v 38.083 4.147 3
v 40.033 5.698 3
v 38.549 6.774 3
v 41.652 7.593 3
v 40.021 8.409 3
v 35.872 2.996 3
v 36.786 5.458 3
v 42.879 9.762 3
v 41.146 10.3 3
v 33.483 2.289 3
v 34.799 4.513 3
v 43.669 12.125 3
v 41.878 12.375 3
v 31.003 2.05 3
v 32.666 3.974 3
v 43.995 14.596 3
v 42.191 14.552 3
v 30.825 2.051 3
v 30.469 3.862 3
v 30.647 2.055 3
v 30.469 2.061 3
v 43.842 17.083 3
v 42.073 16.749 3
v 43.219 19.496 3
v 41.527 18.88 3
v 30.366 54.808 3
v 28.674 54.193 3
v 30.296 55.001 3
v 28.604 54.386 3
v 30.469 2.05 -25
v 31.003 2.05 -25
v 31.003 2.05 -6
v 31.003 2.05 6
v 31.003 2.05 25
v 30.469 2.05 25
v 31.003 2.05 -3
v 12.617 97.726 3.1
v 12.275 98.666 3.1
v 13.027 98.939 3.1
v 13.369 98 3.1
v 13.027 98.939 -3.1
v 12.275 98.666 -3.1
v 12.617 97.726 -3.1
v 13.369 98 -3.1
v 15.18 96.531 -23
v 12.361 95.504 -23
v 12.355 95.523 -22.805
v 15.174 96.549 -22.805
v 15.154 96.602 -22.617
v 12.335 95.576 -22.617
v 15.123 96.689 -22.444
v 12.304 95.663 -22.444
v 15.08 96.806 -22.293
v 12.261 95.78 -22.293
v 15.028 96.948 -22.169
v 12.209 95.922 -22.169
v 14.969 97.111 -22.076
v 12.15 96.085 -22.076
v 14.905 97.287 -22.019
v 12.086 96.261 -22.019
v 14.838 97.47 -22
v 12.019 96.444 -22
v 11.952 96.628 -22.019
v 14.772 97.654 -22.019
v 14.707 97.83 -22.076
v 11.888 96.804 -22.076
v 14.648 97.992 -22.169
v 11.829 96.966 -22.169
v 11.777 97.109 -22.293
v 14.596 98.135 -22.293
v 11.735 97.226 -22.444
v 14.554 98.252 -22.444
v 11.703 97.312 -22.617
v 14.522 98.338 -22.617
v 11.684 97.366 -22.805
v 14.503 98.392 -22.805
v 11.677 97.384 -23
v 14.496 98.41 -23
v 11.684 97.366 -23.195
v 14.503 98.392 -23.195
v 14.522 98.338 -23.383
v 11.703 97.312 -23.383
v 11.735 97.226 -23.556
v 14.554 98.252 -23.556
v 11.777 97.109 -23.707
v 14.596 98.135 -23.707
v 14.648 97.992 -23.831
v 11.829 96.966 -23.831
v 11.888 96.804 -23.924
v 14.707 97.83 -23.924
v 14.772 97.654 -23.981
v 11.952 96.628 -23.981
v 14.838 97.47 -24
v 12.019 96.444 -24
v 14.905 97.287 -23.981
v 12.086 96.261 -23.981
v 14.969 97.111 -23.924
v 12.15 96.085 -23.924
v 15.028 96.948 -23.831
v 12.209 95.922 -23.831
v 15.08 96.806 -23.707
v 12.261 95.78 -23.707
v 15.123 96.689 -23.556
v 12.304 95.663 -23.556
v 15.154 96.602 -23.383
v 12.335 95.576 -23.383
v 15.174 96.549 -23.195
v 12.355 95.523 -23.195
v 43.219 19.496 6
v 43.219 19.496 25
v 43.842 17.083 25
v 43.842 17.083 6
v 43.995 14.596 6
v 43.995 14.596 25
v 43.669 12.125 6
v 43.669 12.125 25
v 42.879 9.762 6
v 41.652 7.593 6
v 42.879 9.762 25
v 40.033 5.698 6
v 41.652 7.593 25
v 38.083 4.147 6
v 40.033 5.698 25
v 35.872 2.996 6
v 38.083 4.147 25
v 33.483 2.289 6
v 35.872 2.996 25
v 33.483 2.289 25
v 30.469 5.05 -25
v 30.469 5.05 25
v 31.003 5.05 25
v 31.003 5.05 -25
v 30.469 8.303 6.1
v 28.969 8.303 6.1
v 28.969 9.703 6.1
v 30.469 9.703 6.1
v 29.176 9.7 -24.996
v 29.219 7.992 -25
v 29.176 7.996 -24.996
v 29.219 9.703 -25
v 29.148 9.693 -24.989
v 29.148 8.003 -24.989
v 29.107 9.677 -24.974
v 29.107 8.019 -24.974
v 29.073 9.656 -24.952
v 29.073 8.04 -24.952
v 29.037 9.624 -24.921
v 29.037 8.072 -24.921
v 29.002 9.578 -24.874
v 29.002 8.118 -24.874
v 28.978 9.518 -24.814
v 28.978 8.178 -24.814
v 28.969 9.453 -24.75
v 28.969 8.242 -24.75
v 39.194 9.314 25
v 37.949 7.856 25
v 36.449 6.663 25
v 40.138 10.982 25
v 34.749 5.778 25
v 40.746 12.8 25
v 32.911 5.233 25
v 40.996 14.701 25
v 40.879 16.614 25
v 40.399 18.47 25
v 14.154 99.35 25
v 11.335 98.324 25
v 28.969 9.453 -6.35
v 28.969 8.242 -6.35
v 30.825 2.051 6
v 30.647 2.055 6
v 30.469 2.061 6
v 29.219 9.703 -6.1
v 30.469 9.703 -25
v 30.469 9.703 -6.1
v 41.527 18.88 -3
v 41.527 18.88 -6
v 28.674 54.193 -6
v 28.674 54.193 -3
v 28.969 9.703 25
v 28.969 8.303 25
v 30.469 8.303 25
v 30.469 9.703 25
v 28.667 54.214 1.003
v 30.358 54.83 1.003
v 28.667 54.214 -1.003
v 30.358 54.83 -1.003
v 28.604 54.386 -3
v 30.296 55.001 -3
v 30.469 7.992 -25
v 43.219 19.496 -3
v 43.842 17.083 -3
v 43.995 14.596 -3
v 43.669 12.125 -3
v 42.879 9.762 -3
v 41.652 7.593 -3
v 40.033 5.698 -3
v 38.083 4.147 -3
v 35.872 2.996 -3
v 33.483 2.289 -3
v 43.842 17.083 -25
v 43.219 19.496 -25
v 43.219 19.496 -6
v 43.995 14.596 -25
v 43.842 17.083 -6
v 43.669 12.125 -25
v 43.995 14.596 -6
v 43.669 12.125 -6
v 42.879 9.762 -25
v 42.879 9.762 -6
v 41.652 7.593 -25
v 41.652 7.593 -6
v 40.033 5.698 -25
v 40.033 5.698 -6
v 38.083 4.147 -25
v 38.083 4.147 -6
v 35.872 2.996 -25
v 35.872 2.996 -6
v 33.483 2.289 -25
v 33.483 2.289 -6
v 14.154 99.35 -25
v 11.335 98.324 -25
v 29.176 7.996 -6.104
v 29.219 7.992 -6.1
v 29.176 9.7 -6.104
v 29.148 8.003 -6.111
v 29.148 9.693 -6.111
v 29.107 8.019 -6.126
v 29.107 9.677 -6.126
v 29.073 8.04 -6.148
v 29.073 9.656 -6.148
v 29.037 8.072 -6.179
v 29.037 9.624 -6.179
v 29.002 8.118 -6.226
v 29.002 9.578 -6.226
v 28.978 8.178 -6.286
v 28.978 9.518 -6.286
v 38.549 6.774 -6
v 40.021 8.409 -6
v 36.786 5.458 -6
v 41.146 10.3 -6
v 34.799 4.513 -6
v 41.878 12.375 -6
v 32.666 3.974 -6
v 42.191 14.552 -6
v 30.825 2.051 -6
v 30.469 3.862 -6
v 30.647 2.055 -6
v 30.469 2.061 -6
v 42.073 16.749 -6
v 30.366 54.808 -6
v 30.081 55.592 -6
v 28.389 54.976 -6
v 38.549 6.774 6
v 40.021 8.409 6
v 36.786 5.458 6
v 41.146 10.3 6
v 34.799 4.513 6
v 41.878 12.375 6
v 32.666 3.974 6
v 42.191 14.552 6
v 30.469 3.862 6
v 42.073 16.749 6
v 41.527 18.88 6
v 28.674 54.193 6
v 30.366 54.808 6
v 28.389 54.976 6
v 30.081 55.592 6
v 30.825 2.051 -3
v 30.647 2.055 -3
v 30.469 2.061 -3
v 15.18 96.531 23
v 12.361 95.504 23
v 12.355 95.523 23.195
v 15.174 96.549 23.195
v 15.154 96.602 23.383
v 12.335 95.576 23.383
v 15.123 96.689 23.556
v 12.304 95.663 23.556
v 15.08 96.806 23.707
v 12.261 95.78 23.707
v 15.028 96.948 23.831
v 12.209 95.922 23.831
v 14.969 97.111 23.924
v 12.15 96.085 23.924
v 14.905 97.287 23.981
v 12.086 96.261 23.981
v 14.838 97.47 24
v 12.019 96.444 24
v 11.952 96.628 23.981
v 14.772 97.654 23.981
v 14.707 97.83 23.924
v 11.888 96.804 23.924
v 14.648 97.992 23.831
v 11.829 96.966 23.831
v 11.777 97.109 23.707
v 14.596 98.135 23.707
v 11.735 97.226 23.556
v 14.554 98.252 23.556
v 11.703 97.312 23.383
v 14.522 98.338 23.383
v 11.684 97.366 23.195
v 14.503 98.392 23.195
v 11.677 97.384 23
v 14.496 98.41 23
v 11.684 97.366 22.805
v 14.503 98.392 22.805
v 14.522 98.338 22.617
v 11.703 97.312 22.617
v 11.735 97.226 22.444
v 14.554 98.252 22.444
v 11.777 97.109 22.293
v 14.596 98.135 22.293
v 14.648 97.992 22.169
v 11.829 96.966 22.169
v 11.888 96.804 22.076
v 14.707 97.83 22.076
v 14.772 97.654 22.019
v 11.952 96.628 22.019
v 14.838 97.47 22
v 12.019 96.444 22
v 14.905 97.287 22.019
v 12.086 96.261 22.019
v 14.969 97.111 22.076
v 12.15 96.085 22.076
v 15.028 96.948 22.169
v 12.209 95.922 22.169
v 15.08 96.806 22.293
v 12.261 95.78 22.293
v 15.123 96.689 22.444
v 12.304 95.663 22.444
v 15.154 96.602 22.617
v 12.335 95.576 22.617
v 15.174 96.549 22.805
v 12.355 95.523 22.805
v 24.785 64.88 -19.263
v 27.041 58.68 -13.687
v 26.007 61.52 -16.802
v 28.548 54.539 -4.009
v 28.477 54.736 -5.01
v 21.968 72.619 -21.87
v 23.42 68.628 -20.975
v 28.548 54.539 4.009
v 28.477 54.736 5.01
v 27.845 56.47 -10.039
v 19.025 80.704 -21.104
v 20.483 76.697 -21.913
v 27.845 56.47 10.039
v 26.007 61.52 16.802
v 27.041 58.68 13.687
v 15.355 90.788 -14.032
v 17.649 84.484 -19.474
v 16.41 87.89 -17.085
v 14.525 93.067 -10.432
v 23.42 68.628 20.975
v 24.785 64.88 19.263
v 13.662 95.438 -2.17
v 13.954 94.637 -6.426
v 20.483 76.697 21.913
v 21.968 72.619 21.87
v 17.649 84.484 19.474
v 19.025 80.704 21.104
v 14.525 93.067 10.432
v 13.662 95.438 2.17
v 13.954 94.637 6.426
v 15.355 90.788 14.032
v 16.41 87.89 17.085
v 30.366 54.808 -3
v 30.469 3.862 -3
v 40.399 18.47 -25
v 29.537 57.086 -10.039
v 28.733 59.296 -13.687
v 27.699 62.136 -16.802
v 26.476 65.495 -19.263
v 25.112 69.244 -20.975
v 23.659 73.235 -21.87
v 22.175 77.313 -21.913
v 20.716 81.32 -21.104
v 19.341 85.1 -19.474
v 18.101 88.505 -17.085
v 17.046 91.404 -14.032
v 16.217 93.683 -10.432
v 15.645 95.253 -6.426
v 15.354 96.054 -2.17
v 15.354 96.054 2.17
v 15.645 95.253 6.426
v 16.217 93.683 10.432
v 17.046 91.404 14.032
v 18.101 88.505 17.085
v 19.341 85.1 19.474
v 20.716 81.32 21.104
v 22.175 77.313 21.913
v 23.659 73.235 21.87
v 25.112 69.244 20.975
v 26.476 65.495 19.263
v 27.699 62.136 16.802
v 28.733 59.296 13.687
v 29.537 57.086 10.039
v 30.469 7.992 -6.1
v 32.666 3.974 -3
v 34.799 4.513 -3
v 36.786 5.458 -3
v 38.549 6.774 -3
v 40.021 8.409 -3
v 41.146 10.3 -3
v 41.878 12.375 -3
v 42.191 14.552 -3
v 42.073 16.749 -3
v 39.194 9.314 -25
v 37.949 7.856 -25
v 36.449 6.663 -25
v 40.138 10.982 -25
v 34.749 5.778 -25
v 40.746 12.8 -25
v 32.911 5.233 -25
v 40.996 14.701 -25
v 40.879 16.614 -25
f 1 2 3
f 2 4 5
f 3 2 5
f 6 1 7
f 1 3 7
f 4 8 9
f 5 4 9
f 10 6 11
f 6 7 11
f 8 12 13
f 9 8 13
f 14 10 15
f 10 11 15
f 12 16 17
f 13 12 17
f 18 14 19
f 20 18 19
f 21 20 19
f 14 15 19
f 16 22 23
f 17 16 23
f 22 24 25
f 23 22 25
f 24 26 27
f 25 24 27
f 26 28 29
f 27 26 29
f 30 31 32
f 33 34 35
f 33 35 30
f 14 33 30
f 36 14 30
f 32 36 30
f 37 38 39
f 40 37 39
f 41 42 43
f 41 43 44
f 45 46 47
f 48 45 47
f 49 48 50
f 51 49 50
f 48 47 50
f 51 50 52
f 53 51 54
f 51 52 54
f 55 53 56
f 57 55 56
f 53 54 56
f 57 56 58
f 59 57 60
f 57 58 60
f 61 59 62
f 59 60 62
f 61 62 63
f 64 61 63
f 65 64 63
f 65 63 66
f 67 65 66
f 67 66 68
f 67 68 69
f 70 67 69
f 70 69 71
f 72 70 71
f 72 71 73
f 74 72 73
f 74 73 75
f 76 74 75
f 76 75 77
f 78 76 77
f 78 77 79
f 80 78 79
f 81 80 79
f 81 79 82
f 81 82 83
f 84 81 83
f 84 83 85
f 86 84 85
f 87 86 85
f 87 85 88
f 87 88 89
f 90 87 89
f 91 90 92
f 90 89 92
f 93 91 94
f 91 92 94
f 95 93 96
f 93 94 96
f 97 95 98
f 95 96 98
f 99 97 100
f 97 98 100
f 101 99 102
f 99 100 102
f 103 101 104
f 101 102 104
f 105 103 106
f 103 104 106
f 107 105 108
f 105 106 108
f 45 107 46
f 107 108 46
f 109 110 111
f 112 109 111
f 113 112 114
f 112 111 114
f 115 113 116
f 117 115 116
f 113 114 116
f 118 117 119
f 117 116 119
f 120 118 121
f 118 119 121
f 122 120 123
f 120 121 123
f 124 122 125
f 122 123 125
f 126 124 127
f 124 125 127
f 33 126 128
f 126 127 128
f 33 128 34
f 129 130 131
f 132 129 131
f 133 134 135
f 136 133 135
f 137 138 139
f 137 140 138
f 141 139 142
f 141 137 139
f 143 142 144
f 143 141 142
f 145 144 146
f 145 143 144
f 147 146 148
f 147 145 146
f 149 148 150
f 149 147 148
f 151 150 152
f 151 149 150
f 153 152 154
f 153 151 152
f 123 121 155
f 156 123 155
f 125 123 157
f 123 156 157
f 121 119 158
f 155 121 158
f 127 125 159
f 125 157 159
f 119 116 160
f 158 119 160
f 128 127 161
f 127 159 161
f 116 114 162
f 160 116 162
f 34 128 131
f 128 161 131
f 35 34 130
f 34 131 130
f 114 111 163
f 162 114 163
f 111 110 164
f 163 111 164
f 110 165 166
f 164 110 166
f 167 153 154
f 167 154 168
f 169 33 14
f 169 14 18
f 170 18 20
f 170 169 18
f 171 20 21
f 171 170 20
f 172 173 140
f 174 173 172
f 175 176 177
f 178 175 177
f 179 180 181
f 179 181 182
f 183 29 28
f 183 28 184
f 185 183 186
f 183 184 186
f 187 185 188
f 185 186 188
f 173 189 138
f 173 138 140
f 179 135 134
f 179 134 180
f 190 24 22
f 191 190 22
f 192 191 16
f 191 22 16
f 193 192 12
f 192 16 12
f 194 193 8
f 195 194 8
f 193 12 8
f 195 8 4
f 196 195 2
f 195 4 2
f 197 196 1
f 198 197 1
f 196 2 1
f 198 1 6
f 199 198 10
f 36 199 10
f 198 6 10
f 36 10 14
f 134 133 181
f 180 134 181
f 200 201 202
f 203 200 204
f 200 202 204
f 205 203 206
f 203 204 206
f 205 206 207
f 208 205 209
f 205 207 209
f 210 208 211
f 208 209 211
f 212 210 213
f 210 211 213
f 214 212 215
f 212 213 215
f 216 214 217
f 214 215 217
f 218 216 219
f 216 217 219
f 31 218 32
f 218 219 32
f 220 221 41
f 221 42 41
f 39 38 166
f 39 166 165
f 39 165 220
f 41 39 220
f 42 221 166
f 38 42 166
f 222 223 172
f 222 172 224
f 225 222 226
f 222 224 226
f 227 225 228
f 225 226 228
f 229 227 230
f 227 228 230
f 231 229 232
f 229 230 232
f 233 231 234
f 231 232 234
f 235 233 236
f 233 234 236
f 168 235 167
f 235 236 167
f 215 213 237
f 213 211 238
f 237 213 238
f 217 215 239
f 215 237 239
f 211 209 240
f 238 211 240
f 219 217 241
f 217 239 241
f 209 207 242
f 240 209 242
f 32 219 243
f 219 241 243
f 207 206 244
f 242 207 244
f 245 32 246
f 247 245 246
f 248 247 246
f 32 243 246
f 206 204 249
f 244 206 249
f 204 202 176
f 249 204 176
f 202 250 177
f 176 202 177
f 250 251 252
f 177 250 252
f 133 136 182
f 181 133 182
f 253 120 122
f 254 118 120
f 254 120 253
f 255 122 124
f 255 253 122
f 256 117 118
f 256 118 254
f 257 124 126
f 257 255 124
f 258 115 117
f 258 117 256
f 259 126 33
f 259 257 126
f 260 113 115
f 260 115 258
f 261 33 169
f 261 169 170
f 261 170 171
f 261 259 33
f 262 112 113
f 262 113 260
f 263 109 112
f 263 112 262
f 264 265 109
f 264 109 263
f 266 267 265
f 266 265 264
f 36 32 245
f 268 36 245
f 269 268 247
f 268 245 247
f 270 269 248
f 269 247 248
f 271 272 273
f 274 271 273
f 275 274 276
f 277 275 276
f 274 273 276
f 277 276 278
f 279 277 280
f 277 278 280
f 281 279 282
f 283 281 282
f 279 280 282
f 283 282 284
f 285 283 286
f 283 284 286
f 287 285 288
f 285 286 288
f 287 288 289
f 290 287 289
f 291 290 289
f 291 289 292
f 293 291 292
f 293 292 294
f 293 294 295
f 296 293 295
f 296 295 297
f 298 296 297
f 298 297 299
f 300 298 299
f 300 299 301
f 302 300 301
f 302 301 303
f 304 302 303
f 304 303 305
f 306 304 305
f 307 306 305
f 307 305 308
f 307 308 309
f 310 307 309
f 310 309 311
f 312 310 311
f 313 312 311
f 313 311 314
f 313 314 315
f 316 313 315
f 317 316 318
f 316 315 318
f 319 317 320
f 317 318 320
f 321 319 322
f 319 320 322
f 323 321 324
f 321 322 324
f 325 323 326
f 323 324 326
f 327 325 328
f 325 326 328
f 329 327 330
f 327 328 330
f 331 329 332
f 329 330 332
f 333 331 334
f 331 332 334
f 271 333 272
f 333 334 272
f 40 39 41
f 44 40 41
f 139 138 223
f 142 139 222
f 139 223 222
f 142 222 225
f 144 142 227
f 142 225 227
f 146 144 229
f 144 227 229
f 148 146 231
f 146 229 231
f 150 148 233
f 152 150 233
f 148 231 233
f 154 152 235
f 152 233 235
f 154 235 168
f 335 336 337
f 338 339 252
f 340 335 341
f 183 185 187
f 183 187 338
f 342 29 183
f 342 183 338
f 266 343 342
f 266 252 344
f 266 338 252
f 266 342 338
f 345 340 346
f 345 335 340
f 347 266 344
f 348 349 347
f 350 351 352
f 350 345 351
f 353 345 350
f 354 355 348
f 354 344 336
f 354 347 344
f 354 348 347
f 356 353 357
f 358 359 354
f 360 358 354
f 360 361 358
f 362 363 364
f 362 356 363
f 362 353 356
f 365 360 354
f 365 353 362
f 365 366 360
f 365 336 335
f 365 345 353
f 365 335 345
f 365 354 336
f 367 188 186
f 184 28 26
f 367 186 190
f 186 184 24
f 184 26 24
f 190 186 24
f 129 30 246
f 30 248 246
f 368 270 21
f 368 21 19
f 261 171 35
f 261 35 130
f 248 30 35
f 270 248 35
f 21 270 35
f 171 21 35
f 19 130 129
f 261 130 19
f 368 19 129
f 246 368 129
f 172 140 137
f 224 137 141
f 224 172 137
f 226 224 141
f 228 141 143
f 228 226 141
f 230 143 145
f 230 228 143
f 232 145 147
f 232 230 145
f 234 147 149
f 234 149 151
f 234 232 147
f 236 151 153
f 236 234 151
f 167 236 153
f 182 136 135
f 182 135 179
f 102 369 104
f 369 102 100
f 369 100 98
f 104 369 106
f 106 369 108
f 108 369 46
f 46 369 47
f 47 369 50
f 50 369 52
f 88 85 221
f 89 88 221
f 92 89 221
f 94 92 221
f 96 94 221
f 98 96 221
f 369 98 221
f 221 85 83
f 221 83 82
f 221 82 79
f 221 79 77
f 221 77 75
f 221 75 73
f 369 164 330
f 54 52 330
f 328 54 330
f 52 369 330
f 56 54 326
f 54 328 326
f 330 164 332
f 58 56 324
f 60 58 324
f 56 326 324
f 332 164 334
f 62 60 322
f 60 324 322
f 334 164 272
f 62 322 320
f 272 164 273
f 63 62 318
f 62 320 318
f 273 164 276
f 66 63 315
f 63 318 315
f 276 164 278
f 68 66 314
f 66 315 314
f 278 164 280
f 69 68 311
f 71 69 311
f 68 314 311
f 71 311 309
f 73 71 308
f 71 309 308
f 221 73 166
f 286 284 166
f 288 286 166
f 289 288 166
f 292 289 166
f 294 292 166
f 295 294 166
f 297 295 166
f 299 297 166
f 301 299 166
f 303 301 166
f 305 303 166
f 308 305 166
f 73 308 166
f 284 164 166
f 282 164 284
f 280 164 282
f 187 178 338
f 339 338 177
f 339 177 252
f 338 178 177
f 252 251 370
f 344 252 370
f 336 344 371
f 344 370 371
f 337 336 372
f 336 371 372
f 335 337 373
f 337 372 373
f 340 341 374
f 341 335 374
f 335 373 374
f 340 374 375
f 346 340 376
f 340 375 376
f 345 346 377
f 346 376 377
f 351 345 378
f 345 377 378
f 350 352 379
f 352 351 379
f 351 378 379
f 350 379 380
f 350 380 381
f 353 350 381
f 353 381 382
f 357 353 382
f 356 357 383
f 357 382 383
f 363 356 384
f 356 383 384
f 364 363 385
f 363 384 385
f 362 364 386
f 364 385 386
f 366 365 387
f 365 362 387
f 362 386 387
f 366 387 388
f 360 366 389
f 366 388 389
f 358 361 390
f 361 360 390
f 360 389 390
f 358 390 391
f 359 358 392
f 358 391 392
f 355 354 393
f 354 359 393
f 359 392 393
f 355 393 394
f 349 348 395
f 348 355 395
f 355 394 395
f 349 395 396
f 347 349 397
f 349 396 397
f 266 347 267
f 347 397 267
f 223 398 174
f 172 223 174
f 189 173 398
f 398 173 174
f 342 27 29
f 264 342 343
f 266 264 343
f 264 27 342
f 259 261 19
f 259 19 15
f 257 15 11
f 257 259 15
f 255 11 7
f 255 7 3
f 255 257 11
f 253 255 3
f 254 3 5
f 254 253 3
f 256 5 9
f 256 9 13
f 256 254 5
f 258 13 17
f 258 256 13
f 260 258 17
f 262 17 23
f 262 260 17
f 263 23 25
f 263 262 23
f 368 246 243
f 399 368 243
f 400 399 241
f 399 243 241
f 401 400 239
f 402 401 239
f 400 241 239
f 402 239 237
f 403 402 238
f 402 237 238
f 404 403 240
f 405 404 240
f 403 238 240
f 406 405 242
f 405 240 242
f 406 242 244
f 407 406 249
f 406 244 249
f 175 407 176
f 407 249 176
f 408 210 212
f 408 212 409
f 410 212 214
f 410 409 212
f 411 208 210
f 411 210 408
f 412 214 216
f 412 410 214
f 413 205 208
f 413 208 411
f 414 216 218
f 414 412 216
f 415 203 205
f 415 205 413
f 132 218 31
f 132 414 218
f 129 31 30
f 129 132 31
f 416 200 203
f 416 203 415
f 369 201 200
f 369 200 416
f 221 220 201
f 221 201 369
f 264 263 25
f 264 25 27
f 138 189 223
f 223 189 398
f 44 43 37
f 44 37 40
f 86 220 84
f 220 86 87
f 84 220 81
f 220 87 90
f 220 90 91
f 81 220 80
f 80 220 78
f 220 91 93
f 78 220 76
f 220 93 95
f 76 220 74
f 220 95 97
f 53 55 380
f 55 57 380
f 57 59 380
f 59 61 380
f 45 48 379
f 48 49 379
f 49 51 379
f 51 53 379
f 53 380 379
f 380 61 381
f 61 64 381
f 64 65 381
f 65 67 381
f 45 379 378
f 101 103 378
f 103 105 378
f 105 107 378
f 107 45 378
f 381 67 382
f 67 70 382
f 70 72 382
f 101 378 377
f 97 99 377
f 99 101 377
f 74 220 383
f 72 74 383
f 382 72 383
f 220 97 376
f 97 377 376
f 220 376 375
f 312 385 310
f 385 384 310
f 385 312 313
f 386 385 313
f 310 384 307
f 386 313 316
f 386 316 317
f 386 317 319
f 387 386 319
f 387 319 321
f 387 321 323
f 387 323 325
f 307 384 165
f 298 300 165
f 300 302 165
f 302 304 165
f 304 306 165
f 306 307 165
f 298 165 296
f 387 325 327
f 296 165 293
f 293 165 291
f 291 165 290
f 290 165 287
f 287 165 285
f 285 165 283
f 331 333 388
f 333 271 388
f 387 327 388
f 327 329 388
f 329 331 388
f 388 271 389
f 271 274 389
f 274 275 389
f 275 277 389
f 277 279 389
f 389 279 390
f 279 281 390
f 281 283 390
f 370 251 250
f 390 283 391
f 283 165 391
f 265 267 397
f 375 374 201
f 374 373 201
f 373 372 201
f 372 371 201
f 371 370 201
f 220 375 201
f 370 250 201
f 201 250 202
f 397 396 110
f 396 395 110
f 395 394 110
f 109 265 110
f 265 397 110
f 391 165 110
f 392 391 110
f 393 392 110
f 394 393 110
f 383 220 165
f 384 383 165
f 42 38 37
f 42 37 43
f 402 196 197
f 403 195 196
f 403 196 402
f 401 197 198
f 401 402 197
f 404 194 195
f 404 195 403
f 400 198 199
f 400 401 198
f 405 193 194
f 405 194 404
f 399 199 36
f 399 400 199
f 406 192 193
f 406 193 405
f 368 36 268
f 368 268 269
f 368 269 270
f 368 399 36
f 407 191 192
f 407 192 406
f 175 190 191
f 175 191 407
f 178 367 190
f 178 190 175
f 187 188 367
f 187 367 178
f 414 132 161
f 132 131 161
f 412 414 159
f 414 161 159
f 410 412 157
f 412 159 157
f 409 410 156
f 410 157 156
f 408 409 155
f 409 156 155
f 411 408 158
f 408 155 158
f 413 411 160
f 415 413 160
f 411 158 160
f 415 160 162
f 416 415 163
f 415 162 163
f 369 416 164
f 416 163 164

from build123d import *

# Parameters (mm, degrees)
EXTRUDE_1_DEPTH        = 25
SKETCH_4_R             = 22
CUT_EXTRUDE_1_DEPTH    = 1.8
CUT_EXTRUDE_START      = 6
CUT_EXTRUDE_1_2_DEPTH  = 3
SKETCH_11_W            = 18.9
SKETCH_11_H            = 1.710874804
EXTRUDE_3_DEPTH        = 1.5
SKETCH_11_H_2          = 1.4
EXTRUDE_3_2_DEPTH      = 1.5
FILLET_1_R             = 0.25
SKETCH_12_R            = 1
CUT_EXTRUDE_2529_DEPTH = 93.908684176
SKETCH_14_W            = 0.8
SKETCH_14_H            = 6.2
CUT_EXTRUDE_2_DEPTH    = 1


with BuildPart() as part:
    # 草图2 → 整体拉伸-薄壁1 (new, symmetric)
    with BuildSketch(Plane.XY):
        with BuildLine():
            Line((30.469246085, 5.049687275), (31.002548264, 5.049687275))
            ThreePointArc((31.002548264, 5.049687275), (39.194068707, 9.313922912), (40.399474472, 18.469888708))
            Line((40.399474472, 18.469888708), (11.335108905, 98.323576814))
            Line((11.335108905, 98.323576814), (14.154186767, 99.349637244))
            Line((14.154186767, 99.349637244), (43.218552334, 19.495949138))
            ThreePointArc((43.218552334, 19.495949138), (41.65152484, 7.593193603), (31.002548264, 2.049687275))
            Line((31.002548264, 2.049687275), (30.469246085, 2.049687275))
            Line((30.469246085, 2.049687275), (30.469246085, 5.049687275))
        make_face()
    extrude(amount=EXTRUDE_1_DEPTH, both=True)

    # 草图4 → Cut-Extrude 1 (cut)
    with BuildSketch(Plane(origin=(44.428819368, 16.170767793, 0), x_dir=(0, 0, -1), z_dir=(0.9396926207859071, 0.3420201433256726, 0))):
        with Locations(Location((0, 63.117104009, 0), (0, 0, 90))):
            Circle(SKETCH_4_R)
    extrude(amount=-CUT_EXTRUDE_1_DEPTH, mode=Mode.SUBTRACT)

    # 草图3 → Cut-Extrude 1 2 (cut)
    with BuildSketch(Plane.XY.offset(CUT_EXTRUDE_START)):
        with BuildLine():
            ThreePointArc((30.469246085, 3.86239141), (40.021460965, 8.408963392), (41.527105617, 18.88031288))
            Line((41.527105617, 18.88031288), (28.674494844, 54.192570761))
            Line((28.674494844, 54.192570761), (27.648434414, 57.011648623))
            Line((27.648434414, 57.011648623), (29.339881131, 57.627284881))
            Line((29.339881131, 57.627284881), (30.365941561, 54.808207019))
            Line((30.365941561, 54.808207019), (43.218552334, 19.495949138))
            ThreePointArc((43.218552334, 19.495949138), (41.470929078, 7.341704197), (30.383536806, 2.064433145))
            Line((30.383536806, 2.064433145), (30.469246085, 3.86239141))
        make_face()
    cut_extrude_1_2 = extrude(amount=-CUT_EXTRUDE_1_2_DEPTH, mode=Mode.SUBTRACT)

    # 镜向1: Cut-Extrude 1 2 across plane
    add(cut_extrude_1_2.mirror(Plane.XY), mode=Mode.SUBTRACT)

    # 草图12 → Cut-Extrude 2529 (cut, through all)
    with BuildSketch(Plane(origin=(41.609741505, 15.144707363, 0), x_dir=(0, 0, 1), z_dir=(-0.9396926207859071, -0.3420201433256726, 0))):
        with Locations(Location((23, 86.517104009, 0), (0, 0, 270))):
            Circle(SKETCH_12_R)
        with Locations(Location((-23, 86.517104009, 0), (0, 0, 270))):
            Circle(SKETCH_12_R)
    extrude(amount=-CUT_EXTRUDE_2529_DEPTH, mode=Mode.SUBTRACT)

    # 草图14 → 切除-拉伸2 (cut)
    with BuildSketch(Plane(origin=(-30.2746326, 83.178869451, 0), x_dir=(0.9396926207859067, 0.3420201433256736, 0), z_dir=(-0.3420201433256736, 0.9396926207859068, 0))):
        with Locations((45.680162028, 0)):
            Rectangle(SKETCH_14_W, SKETCH_14_H)
    extrude(amount=-CUT_EXTRUDE_2_DEPTH, mode=Mode.SUBTRACT)


with BuildPart() as body_2:
    # 草图11 → 底部卡扣凸台-拉伸3 (new body)
    with BuildSketch(Plane.ZY.offset(-30.469246085)):
        with Locations((-15.55, 8.847876505)):
            Rectangle(SKETCH_11_W, SKETCH_11_H)
    extrude(amount=EXTRUDE_3_DEPTH)

    # 底部卡扣圆角1
    fillet_1_edges = [body_2.edges().sort_by_distance(p)[0] for p in [
        (28.969246085, 8.847876505, -6.1),
        (28.969246085, 9.703313907, -15.55),
        (28.969246085, 8.847876505, -25),
        (28.969246085, 7.992439103, -15.55),
    ]]
    fillet(fillet_1_edges, radius=FILLET_1_R)


with BuildPart() as body_3:
    # 草图11 → Extrude 3 2 (new body)
    with BuildSketch(Plane.ZY.offset(-30.469246085)):
        with Locations((15.55, 9.003313907)):
            Rectangle(SKETCH_11_W, SKETCH_11_H_2)
    extrude(amount=EXTRUDE_3_2_DEPTH)


solid = Compound([part.part, body_2.part, body_3.part])
